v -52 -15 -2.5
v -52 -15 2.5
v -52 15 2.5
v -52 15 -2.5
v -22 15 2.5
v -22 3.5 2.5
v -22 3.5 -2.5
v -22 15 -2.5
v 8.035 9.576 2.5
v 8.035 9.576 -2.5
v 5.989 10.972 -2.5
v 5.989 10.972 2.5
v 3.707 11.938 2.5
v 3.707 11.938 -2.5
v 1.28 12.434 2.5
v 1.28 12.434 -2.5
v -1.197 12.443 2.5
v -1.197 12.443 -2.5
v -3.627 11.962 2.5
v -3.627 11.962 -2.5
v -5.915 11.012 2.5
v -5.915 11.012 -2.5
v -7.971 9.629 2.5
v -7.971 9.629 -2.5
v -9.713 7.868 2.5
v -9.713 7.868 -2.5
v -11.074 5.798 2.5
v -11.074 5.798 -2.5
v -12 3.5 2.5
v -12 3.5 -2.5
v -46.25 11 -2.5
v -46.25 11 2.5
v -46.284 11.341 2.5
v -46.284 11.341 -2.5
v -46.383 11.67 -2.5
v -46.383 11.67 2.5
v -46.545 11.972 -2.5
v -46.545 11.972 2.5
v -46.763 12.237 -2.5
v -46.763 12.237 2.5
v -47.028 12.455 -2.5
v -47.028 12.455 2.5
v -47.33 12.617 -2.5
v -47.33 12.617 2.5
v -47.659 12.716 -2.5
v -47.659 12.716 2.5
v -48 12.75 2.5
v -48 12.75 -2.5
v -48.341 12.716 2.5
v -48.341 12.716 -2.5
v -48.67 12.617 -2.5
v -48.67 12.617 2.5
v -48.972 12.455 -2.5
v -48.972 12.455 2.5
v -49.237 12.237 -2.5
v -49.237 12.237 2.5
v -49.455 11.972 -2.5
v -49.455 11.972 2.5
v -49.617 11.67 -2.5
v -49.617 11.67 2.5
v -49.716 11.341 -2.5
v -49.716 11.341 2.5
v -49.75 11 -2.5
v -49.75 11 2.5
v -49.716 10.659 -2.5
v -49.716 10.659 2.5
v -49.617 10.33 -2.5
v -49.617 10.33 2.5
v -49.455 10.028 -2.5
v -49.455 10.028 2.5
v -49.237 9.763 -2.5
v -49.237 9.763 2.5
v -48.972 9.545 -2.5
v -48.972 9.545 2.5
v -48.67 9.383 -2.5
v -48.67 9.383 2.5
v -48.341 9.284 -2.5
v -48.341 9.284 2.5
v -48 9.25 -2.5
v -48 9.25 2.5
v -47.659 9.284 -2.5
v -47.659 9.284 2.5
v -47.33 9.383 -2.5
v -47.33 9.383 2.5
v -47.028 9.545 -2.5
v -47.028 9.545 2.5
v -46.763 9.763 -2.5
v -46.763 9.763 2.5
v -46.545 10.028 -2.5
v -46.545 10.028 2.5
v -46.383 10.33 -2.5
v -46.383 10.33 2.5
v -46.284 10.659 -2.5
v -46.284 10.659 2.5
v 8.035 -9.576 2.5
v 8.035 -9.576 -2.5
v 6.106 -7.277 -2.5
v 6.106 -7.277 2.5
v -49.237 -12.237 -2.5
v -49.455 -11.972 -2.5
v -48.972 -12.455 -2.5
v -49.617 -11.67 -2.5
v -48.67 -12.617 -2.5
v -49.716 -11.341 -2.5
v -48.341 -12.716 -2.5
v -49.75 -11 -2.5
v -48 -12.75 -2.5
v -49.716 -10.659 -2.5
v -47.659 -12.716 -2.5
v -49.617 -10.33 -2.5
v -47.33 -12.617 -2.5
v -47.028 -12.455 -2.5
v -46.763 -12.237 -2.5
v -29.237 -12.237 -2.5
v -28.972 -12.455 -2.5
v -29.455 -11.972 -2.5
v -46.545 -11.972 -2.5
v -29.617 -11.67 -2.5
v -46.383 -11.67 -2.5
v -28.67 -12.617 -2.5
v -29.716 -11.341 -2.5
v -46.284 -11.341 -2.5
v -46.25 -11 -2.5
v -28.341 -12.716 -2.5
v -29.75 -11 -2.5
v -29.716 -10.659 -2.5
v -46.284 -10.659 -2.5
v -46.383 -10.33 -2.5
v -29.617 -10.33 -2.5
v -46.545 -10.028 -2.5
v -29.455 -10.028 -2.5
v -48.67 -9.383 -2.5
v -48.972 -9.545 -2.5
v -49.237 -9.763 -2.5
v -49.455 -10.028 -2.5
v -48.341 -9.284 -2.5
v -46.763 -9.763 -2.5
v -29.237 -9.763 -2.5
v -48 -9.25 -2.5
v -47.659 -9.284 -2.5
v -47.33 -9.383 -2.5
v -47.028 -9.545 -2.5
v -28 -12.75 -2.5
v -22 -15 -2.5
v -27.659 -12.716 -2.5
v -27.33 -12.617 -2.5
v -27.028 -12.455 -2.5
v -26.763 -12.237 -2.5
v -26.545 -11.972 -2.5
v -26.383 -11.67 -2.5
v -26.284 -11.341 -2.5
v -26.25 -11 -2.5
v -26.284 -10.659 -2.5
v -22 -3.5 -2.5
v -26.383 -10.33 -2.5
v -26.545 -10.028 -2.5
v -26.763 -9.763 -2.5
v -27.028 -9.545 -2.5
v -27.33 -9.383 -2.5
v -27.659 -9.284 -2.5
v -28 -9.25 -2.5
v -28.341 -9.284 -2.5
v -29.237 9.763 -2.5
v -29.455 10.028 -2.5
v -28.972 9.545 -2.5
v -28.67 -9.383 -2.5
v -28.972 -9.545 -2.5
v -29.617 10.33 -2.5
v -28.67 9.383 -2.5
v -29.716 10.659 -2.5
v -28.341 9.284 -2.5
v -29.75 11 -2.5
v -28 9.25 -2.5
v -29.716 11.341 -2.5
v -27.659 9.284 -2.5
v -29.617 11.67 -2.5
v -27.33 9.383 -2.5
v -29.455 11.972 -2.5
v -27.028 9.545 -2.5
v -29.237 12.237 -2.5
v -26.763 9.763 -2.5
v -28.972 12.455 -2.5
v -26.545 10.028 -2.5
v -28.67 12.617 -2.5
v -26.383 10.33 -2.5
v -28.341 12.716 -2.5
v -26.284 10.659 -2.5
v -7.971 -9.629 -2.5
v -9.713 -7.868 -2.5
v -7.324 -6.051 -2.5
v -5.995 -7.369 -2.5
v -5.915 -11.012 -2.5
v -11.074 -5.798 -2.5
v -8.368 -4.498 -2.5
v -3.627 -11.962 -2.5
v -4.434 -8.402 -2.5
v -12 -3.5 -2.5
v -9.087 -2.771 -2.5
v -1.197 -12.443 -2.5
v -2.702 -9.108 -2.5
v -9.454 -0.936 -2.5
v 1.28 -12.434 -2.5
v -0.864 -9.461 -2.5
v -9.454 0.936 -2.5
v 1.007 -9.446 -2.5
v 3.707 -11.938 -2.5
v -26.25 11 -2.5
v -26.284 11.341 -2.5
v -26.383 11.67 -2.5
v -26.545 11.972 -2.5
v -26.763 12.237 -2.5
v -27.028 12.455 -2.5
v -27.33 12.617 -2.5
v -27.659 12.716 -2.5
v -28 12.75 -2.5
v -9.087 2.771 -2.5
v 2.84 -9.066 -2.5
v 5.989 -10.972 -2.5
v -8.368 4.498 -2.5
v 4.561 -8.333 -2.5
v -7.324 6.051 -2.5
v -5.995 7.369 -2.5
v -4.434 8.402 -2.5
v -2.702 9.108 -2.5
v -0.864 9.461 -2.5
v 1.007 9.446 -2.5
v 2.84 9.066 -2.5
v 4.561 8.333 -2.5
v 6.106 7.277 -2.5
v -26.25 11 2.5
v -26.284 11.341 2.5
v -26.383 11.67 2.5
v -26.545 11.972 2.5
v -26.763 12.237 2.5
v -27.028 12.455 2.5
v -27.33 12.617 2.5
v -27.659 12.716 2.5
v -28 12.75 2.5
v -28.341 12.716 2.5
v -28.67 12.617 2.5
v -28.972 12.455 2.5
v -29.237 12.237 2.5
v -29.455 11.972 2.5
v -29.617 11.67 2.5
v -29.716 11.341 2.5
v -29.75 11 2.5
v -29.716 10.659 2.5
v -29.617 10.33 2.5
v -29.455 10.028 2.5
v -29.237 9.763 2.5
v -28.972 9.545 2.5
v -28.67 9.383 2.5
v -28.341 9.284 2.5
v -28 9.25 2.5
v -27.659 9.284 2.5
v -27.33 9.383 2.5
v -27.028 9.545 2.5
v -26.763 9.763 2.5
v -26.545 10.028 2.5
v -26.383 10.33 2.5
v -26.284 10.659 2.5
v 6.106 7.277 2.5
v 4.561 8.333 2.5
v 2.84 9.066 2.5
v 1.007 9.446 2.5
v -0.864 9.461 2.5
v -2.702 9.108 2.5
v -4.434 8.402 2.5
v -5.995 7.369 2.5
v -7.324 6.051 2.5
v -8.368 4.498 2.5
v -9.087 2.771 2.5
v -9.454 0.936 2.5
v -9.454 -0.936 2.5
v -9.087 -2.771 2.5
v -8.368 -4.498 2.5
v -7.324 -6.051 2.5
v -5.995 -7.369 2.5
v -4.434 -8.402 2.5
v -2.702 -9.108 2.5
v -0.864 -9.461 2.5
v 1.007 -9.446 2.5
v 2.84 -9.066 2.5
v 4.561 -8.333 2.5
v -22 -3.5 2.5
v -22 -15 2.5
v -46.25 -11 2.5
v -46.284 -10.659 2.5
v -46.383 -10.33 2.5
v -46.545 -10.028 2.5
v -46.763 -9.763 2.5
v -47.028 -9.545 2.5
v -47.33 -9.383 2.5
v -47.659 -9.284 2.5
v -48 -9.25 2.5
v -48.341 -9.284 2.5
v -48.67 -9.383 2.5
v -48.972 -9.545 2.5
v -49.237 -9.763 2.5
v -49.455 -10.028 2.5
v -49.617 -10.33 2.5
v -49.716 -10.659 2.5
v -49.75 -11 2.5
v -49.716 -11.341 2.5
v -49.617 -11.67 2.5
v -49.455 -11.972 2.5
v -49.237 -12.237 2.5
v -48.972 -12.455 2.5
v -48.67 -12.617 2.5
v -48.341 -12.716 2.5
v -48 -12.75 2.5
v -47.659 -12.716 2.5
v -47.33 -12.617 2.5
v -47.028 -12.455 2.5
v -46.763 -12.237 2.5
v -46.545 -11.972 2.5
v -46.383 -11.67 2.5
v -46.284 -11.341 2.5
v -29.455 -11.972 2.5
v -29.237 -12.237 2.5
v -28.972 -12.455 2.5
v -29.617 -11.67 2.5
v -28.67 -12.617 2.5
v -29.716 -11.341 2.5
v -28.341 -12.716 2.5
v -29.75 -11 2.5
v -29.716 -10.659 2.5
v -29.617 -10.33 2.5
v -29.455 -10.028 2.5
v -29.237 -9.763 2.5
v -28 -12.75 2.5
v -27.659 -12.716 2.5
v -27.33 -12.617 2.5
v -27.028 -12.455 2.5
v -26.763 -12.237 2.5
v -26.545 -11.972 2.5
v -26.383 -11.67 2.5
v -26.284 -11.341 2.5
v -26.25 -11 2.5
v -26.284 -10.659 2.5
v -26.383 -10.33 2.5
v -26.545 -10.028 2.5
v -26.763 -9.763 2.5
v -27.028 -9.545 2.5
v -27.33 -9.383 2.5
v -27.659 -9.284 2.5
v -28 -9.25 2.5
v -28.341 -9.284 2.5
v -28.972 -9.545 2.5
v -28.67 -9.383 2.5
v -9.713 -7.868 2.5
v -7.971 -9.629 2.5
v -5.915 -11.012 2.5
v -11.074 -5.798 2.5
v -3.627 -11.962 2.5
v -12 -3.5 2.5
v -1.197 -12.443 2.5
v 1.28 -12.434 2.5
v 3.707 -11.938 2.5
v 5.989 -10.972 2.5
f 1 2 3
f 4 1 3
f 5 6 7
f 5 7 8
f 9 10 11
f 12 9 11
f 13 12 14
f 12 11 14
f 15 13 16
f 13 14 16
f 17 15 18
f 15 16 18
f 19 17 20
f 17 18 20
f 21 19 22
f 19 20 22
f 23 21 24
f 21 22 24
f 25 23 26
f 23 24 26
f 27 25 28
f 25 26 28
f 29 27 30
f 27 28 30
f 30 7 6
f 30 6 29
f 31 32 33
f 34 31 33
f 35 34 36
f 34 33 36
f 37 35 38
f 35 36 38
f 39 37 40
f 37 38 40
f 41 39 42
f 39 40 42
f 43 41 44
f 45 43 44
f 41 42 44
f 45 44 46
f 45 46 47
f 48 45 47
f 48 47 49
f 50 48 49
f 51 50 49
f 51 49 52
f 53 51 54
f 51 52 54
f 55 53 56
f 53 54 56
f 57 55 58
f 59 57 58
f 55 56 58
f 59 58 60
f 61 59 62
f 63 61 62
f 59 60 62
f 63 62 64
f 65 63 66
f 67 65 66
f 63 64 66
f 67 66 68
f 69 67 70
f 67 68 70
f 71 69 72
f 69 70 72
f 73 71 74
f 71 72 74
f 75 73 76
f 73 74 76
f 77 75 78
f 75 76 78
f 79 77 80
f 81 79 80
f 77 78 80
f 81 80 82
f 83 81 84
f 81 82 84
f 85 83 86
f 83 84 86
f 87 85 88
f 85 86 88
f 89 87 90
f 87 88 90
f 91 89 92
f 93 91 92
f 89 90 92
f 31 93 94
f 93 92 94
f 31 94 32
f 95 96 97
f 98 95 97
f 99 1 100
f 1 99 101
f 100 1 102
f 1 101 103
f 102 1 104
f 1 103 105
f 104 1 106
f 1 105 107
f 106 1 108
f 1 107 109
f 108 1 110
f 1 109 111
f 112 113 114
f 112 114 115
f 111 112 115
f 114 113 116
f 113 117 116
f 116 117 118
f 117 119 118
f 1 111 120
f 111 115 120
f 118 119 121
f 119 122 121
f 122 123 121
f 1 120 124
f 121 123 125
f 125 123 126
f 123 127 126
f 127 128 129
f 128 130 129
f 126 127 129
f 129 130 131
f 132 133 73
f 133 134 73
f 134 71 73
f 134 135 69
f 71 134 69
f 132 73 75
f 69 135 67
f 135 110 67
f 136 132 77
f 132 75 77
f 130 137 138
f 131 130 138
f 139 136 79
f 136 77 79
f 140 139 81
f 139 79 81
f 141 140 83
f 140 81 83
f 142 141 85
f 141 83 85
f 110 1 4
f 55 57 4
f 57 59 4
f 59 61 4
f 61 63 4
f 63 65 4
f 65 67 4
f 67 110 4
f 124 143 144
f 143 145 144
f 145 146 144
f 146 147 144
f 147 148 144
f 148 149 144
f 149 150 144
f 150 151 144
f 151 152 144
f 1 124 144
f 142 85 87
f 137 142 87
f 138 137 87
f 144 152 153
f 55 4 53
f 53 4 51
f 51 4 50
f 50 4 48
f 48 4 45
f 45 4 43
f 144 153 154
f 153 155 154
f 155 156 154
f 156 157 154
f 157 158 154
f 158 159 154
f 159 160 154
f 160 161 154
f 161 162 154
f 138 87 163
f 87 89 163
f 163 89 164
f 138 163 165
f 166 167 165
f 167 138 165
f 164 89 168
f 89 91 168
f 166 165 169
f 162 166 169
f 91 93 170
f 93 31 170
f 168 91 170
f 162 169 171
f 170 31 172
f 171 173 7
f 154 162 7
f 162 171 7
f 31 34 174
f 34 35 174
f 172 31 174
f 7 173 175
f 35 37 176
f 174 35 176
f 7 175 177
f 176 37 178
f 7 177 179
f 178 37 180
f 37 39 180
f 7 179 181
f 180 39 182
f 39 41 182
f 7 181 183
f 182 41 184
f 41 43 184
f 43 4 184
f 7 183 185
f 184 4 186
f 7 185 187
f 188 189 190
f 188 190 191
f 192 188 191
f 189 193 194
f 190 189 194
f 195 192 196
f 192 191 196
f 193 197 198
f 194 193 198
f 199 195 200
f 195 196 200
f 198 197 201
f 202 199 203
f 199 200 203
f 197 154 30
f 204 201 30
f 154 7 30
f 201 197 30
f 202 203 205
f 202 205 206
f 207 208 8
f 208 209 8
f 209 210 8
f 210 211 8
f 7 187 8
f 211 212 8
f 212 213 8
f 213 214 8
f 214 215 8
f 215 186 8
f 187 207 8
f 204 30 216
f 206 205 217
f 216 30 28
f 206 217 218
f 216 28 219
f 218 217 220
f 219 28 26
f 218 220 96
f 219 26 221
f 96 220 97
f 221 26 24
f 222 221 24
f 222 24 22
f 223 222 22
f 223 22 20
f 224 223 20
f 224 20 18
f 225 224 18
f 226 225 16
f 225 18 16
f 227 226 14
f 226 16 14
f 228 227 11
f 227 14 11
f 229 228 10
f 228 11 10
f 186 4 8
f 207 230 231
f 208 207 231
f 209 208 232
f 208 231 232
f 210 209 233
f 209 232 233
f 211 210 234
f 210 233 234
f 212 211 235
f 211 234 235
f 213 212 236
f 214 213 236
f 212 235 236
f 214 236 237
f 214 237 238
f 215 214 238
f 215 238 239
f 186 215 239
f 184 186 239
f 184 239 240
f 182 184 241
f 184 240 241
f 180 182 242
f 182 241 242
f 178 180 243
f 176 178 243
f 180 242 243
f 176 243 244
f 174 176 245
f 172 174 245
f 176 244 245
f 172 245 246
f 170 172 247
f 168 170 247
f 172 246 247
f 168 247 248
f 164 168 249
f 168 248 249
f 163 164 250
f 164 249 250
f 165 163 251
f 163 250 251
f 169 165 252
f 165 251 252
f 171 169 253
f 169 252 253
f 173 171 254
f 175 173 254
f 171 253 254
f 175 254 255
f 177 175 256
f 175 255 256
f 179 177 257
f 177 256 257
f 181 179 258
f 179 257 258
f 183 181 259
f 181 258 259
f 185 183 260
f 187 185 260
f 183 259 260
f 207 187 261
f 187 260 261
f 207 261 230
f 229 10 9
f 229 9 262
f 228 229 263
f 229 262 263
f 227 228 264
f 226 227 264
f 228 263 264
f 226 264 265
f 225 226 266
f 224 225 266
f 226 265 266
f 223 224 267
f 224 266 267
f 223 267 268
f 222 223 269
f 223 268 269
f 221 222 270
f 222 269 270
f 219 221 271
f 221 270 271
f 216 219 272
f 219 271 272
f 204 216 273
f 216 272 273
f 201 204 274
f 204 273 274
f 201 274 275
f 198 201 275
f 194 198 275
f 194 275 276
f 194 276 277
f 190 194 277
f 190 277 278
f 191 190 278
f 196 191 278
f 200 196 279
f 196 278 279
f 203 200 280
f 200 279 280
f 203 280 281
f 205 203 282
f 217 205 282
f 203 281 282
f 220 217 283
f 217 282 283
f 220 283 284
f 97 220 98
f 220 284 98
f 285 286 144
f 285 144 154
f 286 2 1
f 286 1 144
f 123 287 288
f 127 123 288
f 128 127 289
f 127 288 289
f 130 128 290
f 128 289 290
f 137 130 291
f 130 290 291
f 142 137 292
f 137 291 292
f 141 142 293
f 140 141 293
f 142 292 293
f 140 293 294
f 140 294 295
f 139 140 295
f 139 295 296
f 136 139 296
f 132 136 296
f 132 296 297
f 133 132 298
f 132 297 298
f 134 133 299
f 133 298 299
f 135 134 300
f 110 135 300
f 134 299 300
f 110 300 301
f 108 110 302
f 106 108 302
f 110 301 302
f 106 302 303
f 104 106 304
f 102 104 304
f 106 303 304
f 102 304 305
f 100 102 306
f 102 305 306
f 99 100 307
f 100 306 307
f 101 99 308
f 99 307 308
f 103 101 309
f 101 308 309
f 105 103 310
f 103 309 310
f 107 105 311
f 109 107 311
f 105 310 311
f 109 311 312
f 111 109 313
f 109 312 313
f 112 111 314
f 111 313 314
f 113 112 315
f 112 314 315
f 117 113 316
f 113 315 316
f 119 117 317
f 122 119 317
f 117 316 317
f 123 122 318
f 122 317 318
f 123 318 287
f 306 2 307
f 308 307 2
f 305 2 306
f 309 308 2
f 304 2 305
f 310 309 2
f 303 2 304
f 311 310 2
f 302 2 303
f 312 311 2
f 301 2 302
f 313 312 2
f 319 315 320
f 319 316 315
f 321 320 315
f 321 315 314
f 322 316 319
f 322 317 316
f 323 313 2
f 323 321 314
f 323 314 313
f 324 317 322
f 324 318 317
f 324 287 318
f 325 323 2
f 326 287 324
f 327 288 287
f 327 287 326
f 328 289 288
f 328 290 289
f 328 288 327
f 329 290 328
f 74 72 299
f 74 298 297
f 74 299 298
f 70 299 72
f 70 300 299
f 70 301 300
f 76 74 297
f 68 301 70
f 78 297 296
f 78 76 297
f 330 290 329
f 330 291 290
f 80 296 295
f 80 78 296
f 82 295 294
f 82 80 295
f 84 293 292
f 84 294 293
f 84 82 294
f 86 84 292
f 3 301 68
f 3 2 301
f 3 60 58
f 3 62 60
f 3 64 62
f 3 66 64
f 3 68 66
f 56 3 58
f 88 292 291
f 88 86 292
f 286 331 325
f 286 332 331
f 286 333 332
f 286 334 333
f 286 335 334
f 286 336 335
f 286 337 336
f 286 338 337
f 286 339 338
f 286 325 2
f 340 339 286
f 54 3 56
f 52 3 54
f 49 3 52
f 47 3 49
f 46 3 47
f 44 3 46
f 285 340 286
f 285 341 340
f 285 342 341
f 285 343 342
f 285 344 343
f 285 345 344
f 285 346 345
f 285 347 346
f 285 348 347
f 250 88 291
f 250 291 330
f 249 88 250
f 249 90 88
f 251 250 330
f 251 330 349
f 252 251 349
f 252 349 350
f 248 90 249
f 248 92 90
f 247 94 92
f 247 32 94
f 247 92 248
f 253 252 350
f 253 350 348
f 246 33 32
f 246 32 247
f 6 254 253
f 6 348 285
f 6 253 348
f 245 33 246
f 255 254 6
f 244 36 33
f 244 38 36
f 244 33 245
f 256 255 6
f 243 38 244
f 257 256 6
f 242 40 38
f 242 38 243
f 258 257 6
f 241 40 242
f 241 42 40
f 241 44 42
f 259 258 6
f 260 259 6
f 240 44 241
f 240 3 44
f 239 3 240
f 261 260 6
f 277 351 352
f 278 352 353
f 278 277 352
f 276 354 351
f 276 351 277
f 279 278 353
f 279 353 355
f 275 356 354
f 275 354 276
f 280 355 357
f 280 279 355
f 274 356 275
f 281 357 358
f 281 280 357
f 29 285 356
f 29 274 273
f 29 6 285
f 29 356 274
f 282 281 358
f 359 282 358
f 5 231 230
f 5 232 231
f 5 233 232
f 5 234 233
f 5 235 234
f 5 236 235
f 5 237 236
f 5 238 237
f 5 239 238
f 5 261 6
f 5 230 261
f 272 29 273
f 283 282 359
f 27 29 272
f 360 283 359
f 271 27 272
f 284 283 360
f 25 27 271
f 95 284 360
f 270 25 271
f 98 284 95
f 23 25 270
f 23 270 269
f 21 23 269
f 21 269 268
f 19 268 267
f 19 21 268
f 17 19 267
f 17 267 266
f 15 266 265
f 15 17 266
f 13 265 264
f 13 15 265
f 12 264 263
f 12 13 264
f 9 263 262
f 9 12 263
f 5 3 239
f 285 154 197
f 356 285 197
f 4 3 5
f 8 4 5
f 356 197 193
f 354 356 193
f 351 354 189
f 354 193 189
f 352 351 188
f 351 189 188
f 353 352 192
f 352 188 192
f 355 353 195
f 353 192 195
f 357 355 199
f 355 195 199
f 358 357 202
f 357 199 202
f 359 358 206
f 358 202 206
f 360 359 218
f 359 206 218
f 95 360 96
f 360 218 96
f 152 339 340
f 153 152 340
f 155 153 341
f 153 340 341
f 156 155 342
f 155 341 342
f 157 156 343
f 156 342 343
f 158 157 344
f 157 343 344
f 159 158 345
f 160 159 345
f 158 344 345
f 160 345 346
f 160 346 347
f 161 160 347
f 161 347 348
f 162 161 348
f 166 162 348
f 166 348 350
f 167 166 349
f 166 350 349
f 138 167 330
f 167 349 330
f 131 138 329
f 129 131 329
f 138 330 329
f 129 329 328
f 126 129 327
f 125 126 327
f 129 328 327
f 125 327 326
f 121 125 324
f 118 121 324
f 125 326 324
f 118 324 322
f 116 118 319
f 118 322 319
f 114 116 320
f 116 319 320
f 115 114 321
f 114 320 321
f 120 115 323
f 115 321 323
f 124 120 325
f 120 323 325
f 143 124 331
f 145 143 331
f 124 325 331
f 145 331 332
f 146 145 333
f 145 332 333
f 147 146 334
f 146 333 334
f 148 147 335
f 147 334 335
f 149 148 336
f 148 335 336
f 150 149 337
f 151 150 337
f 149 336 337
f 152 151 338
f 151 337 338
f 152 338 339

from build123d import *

# Parameters (mm, degrees)
ESBO_O14_W               = 40
ESBO_O14_H               = 5
RESSALTO_EXTRUS_O1_DEPTH = 3.5
ESBO_O15_W               = 30
ESBO_O15_H               = 30
ESBO_O15_R               = 1.75
RESSALTO_EXTRUS_O2_DEPTH = 5


with BuildPart() as part:
    # Esboço14 → Ressalto-extrusão1 (new, symmetric)
    with BuildSketch(Plane(origin=(0, 0, 0), x_dir=(1, 0, 0), z_dir=(0, 1, 0))):
        with Locations((-32, 0)):
            Rectangle(ESBO_O14_W, ESBO_O14_H)
    extrude(amount=RESSALTO_EXTRUS_O1_DEPTH, both=True)

    # Varredura1: sweep along a path in Esboço1
    with BuildLine(Plane.XY) as varredura1_path:
        ThreePointArc((7.070663707, 8.426488874), (-11, 0), (7.070663707, -8.426488874))
    # 3DSketch2 → Varredura1 (sweep)
    with BuildSketch(Plane(origin=(8.034845121, -9.575555539, 2.5), x_dir=(-0.33071149682512846, 0.39412661445355873, -0.8574929257125443), z_dir=(0.7660444431189768, 0.6427876096865409, 3.624573608241852e-15))):
        Polygon((0, 0), (1.543487266, 2.572478777), (5.830951895, 0), (4.287464629, -2.572478777), align=None)
    sweep(path=varredura1_path.line)

    # Esboço15 → Ressalto-extrusão2 (add)
    with BuildSketch(Plane.XY.offset(2.5)):
        with Locations((-37, 0)):
            Rectangle(ESBO_O15_W, ESBO_O15_H)
        with Locations((-48, 11)):
            Circle(ESBO_O15_R, mode=Mode.SUBTRACT)
        with Locations((-28, 11)):
            Circle(ESBO_O15_R, mode=Mode.SUBTRACT)
        with Locations((-28, -11)):
            Circle(ESBO_O15_R, mode=Mode.SUBTRACT)
        with Locations((-48, -11)):
            Circle(ESBO_O15_R, mode=Mode.SUBTRACT)
    extrude(amount=-RESSALTO_EXTRUS_O2_DEPTH)


solid = part.part
